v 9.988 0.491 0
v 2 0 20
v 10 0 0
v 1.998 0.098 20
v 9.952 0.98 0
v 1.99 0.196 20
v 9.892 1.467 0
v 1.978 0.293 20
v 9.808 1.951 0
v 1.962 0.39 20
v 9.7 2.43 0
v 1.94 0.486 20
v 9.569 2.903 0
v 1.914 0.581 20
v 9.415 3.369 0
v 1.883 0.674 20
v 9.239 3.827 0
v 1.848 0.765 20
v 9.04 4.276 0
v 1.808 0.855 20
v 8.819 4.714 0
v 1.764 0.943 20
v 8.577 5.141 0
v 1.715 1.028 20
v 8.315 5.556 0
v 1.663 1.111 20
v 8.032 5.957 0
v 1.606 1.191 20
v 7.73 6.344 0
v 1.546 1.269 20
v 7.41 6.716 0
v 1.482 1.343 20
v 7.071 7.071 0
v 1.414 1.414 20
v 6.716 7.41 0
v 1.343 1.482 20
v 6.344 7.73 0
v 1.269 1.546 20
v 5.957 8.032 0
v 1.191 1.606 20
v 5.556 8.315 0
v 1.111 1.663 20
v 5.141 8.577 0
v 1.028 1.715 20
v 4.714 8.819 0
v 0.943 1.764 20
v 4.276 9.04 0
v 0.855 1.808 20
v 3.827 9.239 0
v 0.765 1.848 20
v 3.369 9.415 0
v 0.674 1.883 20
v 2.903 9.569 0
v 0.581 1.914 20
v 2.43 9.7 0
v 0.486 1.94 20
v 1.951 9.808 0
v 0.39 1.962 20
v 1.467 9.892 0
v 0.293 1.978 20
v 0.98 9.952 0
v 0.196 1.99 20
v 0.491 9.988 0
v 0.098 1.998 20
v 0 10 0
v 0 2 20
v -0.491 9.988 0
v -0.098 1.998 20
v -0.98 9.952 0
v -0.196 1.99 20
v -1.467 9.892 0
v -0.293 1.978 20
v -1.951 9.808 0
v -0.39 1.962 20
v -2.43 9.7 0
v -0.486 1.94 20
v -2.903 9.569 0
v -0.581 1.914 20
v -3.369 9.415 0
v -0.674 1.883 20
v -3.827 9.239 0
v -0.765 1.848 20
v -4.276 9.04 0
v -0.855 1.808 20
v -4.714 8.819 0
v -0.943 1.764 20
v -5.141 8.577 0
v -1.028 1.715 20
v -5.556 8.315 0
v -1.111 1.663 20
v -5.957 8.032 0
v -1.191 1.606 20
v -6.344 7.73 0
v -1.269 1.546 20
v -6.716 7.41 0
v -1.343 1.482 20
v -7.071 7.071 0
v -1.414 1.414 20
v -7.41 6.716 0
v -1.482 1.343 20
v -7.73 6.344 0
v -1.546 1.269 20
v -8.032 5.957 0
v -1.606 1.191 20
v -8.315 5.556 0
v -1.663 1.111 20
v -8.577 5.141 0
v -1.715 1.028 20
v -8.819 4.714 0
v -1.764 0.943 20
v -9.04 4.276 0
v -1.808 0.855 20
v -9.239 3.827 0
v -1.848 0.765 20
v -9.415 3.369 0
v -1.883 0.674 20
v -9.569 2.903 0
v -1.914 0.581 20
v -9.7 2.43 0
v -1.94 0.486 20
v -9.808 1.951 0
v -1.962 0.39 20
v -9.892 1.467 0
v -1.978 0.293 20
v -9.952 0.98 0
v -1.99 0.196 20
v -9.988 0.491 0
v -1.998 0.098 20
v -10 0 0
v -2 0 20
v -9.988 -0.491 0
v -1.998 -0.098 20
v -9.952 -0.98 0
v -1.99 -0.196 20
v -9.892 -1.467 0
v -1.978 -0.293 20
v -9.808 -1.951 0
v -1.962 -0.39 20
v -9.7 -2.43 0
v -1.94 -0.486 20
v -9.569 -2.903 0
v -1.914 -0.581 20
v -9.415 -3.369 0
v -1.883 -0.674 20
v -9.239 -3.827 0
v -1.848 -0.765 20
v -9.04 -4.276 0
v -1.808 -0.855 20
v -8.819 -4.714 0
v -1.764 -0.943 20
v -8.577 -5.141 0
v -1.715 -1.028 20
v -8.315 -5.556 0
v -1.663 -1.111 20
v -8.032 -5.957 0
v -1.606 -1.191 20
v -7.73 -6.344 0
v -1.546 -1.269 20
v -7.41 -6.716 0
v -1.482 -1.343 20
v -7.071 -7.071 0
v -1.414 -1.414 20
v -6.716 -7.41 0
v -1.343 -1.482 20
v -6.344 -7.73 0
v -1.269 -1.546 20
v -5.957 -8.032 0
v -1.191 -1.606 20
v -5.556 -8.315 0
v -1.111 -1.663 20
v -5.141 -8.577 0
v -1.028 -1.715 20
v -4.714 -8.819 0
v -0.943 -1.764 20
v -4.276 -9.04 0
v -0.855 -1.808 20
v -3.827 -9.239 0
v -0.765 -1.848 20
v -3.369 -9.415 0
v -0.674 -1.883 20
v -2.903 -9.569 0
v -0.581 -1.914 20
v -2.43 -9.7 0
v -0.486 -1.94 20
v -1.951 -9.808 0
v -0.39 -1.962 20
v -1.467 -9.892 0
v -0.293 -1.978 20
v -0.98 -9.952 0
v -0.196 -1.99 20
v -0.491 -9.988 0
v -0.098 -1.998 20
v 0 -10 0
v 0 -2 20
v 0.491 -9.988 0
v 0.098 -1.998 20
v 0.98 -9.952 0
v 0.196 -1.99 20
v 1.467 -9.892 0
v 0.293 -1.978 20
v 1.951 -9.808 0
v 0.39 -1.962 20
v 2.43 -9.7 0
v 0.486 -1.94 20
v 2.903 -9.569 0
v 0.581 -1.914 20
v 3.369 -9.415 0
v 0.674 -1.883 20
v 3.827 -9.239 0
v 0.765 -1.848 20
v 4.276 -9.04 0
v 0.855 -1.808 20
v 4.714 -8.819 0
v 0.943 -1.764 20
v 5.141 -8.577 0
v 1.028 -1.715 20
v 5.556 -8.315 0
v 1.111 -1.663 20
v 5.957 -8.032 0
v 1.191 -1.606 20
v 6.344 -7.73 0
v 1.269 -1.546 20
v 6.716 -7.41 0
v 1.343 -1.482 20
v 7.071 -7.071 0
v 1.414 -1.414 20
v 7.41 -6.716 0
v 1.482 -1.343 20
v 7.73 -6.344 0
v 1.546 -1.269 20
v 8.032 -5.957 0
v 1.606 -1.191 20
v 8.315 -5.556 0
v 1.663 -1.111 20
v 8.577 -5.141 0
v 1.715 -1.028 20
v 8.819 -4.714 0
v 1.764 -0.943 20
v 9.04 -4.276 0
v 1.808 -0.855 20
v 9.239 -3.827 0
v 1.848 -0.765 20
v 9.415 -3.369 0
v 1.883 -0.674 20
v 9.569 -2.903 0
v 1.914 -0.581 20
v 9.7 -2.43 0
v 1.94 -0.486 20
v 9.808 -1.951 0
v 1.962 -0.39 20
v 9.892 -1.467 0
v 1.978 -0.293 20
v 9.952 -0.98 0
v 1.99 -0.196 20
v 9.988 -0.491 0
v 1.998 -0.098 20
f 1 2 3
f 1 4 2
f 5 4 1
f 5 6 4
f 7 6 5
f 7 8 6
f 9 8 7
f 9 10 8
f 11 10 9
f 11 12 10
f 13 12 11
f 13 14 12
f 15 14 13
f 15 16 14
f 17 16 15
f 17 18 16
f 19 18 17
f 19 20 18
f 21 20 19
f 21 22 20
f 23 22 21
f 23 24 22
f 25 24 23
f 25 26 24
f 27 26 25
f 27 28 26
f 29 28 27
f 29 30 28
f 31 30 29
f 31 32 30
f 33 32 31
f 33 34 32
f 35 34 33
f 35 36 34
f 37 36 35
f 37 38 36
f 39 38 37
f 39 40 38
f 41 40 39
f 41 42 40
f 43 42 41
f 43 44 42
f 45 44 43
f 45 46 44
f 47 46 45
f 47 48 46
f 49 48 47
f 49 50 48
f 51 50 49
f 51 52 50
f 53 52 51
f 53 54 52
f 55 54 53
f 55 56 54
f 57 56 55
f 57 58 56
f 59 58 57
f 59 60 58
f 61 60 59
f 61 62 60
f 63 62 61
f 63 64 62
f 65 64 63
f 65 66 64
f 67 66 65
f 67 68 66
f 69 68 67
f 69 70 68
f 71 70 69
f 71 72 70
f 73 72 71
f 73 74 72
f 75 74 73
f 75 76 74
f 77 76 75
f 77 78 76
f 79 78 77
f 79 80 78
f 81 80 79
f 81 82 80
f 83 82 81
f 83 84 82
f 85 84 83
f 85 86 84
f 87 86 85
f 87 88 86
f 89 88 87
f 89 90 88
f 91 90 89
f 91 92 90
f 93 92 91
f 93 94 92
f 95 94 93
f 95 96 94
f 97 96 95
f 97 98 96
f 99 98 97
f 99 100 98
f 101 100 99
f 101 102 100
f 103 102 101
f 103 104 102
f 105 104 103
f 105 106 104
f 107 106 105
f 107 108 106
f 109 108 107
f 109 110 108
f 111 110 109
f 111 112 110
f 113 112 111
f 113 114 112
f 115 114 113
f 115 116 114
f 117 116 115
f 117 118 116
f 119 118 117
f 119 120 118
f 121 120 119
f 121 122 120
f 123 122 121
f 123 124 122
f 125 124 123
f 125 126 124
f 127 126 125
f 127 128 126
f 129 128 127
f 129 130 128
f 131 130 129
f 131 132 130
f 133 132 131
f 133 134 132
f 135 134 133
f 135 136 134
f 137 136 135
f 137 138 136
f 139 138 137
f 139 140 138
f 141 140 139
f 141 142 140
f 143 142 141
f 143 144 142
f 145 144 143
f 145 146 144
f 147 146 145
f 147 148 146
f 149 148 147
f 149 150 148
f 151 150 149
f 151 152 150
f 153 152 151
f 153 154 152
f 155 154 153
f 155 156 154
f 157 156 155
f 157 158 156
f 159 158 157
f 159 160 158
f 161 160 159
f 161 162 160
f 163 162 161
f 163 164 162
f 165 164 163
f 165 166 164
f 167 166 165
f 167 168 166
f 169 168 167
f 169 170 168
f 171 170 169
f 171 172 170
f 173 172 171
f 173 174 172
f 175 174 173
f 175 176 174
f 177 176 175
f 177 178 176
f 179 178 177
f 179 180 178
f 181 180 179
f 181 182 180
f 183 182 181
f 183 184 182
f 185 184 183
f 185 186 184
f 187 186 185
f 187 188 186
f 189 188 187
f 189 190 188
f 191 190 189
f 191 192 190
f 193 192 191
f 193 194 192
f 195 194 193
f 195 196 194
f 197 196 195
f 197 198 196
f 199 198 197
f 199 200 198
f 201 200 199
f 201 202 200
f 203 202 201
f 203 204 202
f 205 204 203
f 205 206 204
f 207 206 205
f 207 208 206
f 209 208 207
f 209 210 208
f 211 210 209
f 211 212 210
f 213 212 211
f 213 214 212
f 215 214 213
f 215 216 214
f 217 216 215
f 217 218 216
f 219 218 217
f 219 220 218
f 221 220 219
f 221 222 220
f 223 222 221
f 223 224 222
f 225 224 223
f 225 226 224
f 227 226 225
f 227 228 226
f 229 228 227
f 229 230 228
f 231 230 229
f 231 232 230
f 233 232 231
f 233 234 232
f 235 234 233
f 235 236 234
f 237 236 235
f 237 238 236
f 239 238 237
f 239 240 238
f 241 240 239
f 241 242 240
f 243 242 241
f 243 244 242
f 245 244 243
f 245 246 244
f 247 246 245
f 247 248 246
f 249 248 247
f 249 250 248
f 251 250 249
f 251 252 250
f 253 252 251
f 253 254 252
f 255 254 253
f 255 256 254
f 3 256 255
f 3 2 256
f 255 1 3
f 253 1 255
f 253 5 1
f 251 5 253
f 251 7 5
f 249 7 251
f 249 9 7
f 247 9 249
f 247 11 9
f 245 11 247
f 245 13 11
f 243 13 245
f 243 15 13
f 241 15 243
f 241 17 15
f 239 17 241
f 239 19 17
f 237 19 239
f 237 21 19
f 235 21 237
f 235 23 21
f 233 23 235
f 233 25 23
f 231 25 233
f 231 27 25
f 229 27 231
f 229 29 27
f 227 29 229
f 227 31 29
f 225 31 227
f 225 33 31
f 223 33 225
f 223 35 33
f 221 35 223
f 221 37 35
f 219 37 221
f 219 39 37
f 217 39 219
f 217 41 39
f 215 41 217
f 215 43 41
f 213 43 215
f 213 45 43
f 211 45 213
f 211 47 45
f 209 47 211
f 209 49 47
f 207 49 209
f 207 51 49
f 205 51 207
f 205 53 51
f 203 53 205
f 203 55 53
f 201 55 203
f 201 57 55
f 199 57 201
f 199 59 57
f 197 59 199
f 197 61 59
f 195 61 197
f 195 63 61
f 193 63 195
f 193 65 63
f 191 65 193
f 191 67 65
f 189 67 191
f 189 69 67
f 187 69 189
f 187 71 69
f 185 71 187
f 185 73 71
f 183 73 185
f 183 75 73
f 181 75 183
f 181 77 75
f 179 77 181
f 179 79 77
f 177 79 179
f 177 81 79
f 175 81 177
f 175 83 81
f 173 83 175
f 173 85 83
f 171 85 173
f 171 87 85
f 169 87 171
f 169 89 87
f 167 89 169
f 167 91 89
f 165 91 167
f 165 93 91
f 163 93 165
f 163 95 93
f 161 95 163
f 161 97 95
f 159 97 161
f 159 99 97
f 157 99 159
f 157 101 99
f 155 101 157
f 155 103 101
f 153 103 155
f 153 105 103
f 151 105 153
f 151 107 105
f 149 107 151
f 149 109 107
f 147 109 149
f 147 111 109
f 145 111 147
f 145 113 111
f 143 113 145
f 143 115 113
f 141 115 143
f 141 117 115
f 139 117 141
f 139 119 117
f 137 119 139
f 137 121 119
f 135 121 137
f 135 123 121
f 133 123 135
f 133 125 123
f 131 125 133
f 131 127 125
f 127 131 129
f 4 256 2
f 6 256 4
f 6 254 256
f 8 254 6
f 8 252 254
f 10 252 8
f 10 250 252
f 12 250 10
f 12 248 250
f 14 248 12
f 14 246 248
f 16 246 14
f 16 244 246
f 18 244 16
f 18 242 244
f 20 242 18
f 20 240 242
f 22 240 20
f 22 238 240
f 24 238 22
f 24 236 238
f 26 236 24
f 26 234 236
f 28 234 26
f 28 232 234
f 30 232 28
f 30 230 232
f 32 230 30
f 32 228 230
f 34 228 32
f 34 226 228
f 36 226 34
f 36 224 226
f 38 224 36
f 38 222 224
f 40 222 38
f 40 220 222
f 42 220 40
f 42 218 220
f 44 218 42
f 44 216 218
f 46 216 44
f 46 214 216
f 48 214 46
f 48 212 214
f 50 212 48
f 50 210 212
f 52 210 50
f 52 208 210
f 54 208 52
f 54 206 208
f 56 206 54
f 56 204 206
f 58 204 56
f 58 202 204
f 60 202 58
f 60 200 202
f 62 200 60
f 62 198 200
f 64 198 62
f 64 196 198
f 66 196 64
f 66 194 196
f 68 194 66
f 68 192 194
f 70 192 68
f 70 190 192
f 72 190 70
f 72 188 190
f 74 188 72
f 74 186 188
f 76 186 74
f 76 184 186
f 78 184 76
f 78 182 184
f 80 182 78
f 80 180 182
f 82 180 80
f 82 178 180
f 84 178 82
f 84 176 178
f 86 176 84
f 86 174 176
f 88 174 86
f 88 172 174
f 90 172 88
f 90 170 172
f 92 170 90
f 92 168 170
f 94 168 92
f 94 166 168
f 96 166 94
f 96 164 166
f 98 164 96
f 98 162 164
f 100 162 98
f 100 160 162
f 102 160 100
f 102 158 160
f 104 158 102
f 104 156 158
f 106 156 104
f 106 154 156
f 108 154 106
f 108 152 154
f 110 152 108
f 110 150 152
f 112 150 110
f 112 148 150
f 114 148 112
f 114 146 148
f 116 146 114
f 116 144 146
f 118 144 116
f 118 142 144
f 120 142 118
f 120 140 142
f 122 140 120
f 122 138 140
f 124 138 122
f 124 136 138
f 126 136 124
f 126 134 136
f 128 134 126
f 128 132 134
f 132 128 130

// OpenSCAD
// Auto-generated from tests/data/feature_fixtures_manifest.json
// fixture: negative_cone
// fixture_type: cone
// description: Cone geometry as negative-class fixture to guard against cylinder over-detection.
$fn = 96;

radius1 = 10.000000;
radius2 = 2.000000;
height = 20.000000;

cylinder(r1=radius1, r2=radius2, h=height, $fn=128);
